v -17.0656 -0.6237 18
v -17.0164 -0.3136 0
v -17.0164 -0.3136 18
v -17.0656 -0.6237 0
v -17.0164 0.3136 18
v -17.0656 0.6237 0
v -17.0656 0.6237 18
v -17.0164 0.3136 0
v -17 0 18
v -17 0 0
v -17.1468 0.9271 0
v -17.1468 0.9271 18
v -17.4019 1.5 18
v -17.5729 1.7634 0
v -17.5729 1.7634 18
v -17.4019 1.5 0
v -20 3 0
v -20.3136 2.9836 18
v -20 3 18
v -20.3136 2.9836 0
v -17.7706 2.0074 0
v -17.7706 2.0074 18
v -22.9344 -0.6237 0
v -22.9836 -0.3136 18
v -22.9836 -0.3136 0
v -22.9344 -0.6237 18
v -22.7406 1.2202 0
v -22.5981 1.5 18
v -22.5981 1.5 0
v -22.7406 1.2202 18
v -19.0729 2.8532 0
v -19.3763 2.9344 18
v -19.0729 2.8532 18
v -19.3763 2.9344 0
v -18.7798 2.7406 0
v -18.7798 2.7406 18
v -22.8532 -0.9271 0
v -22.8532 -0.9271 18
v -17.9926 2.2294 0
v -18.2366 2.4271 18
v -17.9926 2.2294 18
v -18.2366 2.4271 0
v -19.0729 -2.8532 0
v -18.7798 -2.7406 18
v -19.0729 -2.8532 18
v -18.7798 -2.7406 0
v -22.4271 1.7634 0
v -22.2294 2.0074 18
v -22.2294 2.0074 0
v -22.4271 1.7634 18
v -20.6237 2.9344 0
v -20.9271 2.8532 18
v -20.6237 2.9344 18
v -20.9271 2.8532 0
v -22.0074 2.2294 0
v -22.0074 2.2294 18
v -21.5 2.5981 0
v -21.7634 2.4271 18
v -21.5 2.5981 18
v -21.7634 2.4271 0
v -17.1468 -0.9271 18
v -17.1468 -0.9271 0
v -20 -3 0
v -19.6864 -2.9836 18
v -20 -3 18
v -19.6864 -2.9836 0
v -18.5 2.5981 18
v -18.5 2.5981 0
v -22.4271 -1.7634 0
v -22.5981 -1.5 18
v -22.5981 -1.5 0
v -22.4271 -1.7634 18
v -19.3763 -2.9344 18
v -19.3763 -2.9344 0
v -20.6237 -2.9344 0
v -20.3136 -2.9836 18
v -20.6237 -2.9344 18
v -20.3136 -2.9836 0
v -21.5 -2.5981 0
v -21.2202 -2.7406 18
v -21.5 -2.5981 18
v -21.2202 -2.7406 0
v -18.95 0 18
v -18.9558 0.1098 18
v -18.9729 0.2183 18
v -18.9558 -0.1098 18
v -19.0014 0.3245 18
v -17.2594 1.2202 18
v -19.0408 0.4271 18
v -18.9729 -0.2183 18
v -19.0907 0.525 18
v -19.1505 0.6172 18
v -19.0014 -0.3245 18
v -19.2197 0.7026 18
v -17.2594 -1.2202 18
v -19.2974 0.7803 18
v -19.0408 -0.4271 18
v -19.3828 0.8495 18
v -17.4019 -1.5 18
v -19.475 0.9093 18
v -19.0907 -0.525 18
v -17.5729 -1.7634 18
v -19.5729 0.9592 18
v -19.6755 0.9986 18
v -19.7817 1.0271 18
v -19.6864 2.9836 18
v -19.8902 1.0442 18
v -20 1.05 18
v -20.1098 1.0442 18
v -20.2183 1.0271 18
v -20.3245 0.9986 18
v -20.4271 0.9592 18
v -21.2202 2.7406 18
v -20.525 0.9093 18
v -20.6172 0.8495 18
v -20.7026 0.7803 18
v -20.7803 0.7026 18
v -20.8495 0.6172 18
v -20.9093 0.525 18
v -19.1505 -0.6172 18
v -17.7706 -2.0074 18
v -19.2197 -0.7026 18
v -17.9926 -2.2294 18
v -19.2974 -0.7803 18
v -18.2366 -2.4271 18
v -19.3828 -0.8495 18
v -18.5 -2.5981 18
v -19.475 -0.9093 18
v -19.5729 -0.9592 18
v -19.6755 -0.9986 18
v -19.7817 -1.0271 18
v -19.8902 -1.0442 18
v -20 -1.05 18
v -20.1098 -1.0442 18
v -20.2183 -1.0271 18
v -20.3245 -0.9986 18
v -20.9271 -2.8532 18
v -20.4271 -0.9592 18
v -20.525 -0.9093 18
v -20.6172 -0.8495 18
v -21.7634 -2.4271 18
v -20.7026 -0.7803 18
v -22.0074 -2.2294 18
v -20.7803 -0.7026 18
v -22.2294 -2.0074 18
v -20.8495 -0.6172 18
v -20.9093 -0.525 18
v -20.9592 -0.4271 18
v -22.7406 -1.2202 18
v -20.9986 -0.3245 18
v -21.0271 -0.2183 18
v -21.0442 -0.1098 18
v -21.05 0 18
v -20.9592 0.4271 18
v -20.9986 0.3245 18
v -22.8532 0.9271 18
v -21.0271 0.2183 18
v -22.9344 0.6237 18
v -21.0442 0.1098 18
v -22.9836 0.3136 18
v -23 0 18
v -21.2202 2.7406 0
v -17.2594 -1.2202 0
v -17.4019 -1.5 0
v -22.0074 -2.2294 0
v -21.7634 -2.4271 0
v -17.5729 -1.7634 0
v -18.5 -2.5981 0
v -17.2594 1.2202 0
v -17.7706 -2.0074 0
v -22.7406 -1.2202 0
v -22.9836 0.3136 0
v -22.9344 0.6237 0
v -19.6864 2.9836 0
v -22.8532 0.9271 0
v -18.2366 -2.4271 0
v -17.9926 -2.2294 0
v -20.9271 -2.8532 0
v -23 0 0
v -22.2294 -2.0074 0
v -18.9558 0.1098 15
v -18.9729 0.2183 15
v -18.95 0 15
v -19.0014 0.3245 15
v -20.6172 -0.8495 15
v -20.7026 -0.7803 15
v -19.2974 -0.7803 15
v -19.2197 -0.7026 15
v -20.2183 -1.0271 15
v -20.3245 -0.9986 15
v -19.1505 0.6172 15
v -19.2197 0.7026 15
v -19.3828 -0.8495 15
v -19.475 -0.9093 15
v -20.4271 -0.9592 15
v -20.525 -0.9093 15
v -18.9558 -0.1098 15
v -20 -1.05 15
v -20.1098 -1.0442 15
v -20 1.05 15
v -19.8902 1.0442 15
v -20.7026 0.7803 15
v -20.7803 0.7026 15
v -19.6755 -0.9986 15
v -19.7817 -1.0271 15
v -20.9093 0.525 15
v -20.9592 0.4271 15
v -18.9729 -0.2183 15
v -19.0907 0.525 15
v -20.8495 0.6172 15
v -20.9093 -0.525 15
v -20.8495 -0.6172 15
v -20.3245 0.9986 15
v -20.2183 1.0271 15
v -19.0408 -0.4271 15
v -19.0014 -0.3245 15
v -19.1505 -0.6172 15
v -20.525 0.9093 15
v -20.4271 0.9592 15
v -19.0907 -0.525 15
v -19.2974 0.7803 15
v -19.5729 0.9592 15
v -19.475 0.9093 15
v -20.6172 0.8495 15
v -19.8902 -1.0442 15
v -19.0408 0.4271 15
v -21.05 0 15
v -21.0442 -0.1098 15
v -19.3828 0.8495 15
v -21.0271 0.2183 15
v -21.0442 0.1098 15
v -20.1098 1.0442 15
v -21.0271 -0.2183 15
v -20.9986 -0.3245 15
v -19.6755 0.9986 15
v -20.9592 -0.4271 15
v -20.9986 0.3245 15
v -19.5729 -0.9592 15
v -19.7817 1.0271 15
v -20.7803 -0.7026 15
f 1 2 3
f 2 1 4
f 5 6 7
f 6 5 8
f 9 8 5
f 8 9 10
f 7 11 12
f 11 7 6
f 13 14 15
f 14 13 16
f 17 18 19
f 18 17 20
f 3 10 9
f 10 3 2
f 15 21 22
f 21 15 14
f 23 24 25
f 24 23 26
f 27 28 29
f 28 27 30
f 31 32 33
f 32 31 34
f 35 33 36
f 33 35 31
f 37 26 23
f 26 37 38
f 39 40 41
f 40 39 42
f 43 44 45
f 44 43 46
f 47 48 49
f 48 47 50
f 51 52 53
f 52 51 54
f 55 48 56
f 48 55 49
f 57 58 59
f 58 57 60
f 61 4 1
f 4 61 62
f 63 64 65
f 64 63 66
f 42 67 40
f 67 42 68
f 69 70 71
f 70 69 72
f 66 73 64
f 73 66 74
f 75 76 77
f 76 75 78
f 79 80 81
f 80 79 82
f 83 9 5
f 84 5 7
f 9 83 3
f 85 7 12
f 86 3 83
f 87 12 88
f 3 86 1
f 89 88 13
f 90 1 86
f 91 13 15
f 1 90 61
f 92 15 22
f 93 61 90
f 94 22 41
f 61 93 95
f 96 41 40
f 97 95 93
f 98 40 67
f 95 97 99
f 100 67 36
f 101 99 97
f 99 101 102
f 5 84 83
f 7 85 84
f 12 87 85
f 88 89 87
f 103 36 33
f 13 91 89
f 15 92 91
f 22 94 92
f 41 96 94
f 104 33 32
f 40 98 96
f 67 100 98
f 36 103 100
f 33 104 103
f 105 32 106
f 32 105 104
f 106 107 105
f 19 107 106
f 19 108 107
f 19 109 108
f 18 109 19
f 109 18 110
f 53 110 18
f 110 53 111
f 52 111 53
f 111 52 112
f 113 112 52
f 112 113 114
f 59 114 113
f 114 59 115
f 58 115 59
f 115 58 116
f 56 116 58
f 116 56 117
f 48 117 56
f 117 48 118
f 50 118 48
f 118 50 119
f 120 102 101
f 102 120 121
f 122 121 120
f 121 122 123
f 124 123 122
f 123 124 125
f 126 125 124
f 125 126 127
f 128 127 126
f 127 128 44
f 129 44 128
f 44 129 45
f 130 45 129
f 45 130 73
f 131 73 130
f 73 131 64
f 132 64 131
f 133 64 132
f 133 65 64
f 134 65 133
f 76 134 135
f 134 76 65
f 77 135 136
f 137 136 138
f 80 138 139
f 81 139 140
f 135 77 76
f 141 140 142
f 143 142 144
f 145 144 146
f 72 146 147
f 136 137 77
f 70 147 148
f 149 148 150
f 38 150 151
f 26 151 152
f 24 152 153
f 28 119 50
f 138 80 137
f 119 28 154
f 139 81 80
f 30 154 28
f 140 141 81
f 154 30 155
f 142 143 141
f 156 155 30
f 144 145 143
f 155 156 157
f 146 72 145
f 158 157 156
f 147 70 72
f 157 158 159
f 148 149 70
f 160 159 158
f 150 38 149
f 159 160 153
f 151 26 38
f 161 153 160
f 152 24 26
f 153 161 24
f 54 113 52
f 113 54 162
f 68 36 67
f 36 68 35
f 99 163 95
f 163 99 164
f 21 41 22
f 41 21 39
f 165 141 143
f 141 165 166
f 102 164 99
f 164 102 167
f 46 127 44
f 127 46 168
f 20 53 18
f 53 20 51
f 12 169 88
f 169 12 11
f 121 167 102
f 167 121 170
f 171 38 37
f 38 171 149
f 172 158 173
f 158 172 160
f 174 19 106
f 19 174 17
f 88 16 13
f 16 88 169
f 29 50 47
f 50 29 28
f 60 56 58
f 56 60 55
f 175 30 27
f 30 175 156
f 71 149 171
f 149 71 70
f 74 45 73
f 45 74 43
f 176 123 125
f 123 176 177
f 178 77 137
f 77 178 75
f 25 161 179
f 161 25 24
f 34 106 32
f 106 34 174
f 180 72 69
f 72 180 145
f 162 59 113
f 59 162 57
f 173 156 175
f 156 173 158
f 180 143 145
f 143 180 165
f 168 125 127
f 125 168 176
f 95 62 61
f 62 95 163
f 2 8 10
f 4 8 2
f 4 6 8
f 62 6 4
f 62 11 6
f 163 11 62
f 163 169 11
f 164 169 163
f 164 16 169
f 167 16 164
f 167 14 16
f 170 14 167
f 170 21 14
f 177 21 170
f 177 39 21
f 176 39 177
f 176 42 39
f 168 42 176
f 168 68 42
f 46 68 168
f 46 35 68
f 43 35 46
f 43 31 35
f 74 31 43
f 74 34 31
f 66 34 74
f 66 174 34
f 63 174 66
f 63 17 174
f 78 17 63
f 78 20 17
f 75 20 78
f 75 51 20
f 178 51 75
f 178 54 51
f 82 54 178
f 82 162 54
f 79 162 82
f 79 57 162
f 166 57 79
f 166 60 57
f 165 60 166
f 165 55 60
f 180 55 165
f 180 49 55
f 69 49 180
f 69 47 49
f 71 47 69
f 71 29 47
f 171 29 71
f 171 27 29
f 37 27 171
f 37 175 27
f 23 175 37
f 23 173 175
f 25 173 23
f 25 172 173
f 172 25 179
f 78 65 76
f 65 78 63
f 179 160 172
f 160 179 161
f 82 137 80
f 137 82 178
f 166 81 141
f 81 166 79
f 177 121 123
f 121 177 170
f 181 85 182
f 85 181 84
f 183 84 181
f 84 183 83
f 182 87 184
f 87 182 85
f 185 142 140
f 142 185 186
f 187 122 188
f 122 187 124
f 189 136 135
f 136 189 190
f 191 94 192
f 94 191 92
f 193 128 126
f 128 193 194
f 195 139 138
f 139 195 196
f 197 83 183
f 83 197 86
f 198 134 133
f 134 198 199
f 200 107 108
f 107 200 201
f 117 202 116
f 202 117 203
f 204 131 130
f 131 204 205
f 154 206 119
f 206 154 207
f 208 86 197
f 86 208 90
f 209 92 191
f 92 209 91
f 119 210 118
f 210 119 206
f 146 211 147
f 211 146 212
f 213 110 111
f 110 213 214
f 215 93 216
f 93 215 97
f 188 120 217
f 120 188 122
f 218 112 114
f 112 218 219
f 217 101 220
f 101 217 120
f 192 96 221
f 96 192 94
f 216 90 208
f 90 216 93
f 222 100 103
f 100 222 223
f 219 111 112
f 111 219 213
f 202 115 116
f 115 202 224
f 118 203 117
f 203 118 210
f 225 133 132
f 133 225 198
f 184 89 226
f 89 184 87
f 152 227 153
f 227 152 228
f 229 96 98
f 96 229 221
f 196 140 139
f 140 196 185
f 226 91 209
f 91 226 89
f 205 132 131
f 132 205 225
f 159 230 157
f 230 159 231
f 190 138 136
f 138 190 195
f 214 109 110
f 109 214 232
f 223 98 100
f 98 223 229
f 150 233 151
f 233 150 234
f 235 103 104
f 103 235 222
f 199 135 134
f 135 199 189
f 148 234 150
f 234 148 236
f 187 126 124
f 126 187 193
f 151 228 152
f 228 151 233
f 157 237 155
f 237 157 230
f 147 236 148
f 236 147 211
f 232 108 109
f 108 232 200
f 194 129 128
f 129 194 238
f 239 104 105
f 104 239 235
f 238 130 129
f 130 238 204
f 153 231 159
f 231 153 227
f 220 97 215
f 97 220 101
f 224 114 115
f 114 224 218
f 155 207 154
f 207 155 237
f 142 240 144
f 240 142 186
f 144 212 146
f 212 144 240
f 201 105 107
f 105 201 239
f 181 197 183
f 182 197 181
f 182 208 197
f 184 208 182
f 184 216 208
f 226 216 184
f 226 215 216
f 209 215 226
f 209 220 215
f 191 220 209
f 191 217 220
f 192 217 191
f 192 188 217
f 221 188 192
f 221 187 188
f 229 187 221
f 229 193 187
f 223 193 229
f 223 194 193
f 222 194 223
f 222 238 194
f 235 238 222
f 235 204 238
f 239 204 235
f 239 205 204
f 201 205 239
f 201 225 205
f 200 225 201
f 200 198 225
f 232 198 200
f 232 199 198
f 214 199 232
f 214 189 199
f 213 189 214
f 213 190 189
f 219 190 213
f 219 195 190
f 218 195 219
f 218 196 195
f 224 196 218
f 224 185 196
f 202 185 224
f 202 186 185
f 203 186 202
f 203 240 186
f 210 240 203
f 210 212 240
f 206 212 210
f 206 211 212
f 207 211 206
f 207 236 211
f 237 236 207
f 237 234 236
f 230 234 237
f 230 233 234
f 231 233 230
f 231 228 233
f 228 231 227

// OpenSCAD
// 完善的螺栓柱模块
// diameter: 螺栓规格 ("m2" 或 "m3")
// height: 螺栓柱总高度
// rib_height: 圆柱形加强筋高度（从底部开始的高度）
// rib_thickness: 加强筋厚度
// pos: [x, y, z] 螺栓柱底部的坐标
// fn: 圆柱面细分度（默认30）
module bolt_post(diameter="m3", height=10, rib_height=5, rib_thickness=2, pos=[0, 0, 0], fn=60) {
    // 设置螺栓直径
    bolt_diameter = (diameter == "m3") ? 3.0 : (diameter == "m2") ? 2.0 : 3.0;
    
    // 螺栓孔直径（略大于标准直径以便装配）
    hole_diameter = bolt_diameter + 0.1;
    
    // 加强筋外径
    rib_outer_diameter = bolt_diameter + rib_thickness * 2;
    
    // 移动到指定位置
    translate(pos) {
        // 主要的螺栓孔（贯穿整个高度）
        cylinder(h = height, d = hole_diameter, $fn = fn);
        
        // 圆柱形加强筋（如果设置了高度和厚度）
        if (rib_height > 0 && rib_thickness > 0) {
            // 加强筋从底部向上延伸指定高度
            difference() {
                // 外层圆柱（加强筋区域）
                cylinder(h = rib_height, d = rib_outer_diameter, $fn = fn);
                
                // 内层圆柱（保持螺栓孔）
                cylinder(h = rib_height, d = hole_diameter, $fn = fn);
            }
        }
    }
}

// 示例使用 - 展示不同配置的螺栓柱
// M3螺栓柱，高度15mm，加强筋高度10mm，厚度2mm
translate([-20, 0, 0])
bolt_post(diameter="m2", height=15, rib_height=18, rib_thickness=2, pos=[0, 0, 0]);
